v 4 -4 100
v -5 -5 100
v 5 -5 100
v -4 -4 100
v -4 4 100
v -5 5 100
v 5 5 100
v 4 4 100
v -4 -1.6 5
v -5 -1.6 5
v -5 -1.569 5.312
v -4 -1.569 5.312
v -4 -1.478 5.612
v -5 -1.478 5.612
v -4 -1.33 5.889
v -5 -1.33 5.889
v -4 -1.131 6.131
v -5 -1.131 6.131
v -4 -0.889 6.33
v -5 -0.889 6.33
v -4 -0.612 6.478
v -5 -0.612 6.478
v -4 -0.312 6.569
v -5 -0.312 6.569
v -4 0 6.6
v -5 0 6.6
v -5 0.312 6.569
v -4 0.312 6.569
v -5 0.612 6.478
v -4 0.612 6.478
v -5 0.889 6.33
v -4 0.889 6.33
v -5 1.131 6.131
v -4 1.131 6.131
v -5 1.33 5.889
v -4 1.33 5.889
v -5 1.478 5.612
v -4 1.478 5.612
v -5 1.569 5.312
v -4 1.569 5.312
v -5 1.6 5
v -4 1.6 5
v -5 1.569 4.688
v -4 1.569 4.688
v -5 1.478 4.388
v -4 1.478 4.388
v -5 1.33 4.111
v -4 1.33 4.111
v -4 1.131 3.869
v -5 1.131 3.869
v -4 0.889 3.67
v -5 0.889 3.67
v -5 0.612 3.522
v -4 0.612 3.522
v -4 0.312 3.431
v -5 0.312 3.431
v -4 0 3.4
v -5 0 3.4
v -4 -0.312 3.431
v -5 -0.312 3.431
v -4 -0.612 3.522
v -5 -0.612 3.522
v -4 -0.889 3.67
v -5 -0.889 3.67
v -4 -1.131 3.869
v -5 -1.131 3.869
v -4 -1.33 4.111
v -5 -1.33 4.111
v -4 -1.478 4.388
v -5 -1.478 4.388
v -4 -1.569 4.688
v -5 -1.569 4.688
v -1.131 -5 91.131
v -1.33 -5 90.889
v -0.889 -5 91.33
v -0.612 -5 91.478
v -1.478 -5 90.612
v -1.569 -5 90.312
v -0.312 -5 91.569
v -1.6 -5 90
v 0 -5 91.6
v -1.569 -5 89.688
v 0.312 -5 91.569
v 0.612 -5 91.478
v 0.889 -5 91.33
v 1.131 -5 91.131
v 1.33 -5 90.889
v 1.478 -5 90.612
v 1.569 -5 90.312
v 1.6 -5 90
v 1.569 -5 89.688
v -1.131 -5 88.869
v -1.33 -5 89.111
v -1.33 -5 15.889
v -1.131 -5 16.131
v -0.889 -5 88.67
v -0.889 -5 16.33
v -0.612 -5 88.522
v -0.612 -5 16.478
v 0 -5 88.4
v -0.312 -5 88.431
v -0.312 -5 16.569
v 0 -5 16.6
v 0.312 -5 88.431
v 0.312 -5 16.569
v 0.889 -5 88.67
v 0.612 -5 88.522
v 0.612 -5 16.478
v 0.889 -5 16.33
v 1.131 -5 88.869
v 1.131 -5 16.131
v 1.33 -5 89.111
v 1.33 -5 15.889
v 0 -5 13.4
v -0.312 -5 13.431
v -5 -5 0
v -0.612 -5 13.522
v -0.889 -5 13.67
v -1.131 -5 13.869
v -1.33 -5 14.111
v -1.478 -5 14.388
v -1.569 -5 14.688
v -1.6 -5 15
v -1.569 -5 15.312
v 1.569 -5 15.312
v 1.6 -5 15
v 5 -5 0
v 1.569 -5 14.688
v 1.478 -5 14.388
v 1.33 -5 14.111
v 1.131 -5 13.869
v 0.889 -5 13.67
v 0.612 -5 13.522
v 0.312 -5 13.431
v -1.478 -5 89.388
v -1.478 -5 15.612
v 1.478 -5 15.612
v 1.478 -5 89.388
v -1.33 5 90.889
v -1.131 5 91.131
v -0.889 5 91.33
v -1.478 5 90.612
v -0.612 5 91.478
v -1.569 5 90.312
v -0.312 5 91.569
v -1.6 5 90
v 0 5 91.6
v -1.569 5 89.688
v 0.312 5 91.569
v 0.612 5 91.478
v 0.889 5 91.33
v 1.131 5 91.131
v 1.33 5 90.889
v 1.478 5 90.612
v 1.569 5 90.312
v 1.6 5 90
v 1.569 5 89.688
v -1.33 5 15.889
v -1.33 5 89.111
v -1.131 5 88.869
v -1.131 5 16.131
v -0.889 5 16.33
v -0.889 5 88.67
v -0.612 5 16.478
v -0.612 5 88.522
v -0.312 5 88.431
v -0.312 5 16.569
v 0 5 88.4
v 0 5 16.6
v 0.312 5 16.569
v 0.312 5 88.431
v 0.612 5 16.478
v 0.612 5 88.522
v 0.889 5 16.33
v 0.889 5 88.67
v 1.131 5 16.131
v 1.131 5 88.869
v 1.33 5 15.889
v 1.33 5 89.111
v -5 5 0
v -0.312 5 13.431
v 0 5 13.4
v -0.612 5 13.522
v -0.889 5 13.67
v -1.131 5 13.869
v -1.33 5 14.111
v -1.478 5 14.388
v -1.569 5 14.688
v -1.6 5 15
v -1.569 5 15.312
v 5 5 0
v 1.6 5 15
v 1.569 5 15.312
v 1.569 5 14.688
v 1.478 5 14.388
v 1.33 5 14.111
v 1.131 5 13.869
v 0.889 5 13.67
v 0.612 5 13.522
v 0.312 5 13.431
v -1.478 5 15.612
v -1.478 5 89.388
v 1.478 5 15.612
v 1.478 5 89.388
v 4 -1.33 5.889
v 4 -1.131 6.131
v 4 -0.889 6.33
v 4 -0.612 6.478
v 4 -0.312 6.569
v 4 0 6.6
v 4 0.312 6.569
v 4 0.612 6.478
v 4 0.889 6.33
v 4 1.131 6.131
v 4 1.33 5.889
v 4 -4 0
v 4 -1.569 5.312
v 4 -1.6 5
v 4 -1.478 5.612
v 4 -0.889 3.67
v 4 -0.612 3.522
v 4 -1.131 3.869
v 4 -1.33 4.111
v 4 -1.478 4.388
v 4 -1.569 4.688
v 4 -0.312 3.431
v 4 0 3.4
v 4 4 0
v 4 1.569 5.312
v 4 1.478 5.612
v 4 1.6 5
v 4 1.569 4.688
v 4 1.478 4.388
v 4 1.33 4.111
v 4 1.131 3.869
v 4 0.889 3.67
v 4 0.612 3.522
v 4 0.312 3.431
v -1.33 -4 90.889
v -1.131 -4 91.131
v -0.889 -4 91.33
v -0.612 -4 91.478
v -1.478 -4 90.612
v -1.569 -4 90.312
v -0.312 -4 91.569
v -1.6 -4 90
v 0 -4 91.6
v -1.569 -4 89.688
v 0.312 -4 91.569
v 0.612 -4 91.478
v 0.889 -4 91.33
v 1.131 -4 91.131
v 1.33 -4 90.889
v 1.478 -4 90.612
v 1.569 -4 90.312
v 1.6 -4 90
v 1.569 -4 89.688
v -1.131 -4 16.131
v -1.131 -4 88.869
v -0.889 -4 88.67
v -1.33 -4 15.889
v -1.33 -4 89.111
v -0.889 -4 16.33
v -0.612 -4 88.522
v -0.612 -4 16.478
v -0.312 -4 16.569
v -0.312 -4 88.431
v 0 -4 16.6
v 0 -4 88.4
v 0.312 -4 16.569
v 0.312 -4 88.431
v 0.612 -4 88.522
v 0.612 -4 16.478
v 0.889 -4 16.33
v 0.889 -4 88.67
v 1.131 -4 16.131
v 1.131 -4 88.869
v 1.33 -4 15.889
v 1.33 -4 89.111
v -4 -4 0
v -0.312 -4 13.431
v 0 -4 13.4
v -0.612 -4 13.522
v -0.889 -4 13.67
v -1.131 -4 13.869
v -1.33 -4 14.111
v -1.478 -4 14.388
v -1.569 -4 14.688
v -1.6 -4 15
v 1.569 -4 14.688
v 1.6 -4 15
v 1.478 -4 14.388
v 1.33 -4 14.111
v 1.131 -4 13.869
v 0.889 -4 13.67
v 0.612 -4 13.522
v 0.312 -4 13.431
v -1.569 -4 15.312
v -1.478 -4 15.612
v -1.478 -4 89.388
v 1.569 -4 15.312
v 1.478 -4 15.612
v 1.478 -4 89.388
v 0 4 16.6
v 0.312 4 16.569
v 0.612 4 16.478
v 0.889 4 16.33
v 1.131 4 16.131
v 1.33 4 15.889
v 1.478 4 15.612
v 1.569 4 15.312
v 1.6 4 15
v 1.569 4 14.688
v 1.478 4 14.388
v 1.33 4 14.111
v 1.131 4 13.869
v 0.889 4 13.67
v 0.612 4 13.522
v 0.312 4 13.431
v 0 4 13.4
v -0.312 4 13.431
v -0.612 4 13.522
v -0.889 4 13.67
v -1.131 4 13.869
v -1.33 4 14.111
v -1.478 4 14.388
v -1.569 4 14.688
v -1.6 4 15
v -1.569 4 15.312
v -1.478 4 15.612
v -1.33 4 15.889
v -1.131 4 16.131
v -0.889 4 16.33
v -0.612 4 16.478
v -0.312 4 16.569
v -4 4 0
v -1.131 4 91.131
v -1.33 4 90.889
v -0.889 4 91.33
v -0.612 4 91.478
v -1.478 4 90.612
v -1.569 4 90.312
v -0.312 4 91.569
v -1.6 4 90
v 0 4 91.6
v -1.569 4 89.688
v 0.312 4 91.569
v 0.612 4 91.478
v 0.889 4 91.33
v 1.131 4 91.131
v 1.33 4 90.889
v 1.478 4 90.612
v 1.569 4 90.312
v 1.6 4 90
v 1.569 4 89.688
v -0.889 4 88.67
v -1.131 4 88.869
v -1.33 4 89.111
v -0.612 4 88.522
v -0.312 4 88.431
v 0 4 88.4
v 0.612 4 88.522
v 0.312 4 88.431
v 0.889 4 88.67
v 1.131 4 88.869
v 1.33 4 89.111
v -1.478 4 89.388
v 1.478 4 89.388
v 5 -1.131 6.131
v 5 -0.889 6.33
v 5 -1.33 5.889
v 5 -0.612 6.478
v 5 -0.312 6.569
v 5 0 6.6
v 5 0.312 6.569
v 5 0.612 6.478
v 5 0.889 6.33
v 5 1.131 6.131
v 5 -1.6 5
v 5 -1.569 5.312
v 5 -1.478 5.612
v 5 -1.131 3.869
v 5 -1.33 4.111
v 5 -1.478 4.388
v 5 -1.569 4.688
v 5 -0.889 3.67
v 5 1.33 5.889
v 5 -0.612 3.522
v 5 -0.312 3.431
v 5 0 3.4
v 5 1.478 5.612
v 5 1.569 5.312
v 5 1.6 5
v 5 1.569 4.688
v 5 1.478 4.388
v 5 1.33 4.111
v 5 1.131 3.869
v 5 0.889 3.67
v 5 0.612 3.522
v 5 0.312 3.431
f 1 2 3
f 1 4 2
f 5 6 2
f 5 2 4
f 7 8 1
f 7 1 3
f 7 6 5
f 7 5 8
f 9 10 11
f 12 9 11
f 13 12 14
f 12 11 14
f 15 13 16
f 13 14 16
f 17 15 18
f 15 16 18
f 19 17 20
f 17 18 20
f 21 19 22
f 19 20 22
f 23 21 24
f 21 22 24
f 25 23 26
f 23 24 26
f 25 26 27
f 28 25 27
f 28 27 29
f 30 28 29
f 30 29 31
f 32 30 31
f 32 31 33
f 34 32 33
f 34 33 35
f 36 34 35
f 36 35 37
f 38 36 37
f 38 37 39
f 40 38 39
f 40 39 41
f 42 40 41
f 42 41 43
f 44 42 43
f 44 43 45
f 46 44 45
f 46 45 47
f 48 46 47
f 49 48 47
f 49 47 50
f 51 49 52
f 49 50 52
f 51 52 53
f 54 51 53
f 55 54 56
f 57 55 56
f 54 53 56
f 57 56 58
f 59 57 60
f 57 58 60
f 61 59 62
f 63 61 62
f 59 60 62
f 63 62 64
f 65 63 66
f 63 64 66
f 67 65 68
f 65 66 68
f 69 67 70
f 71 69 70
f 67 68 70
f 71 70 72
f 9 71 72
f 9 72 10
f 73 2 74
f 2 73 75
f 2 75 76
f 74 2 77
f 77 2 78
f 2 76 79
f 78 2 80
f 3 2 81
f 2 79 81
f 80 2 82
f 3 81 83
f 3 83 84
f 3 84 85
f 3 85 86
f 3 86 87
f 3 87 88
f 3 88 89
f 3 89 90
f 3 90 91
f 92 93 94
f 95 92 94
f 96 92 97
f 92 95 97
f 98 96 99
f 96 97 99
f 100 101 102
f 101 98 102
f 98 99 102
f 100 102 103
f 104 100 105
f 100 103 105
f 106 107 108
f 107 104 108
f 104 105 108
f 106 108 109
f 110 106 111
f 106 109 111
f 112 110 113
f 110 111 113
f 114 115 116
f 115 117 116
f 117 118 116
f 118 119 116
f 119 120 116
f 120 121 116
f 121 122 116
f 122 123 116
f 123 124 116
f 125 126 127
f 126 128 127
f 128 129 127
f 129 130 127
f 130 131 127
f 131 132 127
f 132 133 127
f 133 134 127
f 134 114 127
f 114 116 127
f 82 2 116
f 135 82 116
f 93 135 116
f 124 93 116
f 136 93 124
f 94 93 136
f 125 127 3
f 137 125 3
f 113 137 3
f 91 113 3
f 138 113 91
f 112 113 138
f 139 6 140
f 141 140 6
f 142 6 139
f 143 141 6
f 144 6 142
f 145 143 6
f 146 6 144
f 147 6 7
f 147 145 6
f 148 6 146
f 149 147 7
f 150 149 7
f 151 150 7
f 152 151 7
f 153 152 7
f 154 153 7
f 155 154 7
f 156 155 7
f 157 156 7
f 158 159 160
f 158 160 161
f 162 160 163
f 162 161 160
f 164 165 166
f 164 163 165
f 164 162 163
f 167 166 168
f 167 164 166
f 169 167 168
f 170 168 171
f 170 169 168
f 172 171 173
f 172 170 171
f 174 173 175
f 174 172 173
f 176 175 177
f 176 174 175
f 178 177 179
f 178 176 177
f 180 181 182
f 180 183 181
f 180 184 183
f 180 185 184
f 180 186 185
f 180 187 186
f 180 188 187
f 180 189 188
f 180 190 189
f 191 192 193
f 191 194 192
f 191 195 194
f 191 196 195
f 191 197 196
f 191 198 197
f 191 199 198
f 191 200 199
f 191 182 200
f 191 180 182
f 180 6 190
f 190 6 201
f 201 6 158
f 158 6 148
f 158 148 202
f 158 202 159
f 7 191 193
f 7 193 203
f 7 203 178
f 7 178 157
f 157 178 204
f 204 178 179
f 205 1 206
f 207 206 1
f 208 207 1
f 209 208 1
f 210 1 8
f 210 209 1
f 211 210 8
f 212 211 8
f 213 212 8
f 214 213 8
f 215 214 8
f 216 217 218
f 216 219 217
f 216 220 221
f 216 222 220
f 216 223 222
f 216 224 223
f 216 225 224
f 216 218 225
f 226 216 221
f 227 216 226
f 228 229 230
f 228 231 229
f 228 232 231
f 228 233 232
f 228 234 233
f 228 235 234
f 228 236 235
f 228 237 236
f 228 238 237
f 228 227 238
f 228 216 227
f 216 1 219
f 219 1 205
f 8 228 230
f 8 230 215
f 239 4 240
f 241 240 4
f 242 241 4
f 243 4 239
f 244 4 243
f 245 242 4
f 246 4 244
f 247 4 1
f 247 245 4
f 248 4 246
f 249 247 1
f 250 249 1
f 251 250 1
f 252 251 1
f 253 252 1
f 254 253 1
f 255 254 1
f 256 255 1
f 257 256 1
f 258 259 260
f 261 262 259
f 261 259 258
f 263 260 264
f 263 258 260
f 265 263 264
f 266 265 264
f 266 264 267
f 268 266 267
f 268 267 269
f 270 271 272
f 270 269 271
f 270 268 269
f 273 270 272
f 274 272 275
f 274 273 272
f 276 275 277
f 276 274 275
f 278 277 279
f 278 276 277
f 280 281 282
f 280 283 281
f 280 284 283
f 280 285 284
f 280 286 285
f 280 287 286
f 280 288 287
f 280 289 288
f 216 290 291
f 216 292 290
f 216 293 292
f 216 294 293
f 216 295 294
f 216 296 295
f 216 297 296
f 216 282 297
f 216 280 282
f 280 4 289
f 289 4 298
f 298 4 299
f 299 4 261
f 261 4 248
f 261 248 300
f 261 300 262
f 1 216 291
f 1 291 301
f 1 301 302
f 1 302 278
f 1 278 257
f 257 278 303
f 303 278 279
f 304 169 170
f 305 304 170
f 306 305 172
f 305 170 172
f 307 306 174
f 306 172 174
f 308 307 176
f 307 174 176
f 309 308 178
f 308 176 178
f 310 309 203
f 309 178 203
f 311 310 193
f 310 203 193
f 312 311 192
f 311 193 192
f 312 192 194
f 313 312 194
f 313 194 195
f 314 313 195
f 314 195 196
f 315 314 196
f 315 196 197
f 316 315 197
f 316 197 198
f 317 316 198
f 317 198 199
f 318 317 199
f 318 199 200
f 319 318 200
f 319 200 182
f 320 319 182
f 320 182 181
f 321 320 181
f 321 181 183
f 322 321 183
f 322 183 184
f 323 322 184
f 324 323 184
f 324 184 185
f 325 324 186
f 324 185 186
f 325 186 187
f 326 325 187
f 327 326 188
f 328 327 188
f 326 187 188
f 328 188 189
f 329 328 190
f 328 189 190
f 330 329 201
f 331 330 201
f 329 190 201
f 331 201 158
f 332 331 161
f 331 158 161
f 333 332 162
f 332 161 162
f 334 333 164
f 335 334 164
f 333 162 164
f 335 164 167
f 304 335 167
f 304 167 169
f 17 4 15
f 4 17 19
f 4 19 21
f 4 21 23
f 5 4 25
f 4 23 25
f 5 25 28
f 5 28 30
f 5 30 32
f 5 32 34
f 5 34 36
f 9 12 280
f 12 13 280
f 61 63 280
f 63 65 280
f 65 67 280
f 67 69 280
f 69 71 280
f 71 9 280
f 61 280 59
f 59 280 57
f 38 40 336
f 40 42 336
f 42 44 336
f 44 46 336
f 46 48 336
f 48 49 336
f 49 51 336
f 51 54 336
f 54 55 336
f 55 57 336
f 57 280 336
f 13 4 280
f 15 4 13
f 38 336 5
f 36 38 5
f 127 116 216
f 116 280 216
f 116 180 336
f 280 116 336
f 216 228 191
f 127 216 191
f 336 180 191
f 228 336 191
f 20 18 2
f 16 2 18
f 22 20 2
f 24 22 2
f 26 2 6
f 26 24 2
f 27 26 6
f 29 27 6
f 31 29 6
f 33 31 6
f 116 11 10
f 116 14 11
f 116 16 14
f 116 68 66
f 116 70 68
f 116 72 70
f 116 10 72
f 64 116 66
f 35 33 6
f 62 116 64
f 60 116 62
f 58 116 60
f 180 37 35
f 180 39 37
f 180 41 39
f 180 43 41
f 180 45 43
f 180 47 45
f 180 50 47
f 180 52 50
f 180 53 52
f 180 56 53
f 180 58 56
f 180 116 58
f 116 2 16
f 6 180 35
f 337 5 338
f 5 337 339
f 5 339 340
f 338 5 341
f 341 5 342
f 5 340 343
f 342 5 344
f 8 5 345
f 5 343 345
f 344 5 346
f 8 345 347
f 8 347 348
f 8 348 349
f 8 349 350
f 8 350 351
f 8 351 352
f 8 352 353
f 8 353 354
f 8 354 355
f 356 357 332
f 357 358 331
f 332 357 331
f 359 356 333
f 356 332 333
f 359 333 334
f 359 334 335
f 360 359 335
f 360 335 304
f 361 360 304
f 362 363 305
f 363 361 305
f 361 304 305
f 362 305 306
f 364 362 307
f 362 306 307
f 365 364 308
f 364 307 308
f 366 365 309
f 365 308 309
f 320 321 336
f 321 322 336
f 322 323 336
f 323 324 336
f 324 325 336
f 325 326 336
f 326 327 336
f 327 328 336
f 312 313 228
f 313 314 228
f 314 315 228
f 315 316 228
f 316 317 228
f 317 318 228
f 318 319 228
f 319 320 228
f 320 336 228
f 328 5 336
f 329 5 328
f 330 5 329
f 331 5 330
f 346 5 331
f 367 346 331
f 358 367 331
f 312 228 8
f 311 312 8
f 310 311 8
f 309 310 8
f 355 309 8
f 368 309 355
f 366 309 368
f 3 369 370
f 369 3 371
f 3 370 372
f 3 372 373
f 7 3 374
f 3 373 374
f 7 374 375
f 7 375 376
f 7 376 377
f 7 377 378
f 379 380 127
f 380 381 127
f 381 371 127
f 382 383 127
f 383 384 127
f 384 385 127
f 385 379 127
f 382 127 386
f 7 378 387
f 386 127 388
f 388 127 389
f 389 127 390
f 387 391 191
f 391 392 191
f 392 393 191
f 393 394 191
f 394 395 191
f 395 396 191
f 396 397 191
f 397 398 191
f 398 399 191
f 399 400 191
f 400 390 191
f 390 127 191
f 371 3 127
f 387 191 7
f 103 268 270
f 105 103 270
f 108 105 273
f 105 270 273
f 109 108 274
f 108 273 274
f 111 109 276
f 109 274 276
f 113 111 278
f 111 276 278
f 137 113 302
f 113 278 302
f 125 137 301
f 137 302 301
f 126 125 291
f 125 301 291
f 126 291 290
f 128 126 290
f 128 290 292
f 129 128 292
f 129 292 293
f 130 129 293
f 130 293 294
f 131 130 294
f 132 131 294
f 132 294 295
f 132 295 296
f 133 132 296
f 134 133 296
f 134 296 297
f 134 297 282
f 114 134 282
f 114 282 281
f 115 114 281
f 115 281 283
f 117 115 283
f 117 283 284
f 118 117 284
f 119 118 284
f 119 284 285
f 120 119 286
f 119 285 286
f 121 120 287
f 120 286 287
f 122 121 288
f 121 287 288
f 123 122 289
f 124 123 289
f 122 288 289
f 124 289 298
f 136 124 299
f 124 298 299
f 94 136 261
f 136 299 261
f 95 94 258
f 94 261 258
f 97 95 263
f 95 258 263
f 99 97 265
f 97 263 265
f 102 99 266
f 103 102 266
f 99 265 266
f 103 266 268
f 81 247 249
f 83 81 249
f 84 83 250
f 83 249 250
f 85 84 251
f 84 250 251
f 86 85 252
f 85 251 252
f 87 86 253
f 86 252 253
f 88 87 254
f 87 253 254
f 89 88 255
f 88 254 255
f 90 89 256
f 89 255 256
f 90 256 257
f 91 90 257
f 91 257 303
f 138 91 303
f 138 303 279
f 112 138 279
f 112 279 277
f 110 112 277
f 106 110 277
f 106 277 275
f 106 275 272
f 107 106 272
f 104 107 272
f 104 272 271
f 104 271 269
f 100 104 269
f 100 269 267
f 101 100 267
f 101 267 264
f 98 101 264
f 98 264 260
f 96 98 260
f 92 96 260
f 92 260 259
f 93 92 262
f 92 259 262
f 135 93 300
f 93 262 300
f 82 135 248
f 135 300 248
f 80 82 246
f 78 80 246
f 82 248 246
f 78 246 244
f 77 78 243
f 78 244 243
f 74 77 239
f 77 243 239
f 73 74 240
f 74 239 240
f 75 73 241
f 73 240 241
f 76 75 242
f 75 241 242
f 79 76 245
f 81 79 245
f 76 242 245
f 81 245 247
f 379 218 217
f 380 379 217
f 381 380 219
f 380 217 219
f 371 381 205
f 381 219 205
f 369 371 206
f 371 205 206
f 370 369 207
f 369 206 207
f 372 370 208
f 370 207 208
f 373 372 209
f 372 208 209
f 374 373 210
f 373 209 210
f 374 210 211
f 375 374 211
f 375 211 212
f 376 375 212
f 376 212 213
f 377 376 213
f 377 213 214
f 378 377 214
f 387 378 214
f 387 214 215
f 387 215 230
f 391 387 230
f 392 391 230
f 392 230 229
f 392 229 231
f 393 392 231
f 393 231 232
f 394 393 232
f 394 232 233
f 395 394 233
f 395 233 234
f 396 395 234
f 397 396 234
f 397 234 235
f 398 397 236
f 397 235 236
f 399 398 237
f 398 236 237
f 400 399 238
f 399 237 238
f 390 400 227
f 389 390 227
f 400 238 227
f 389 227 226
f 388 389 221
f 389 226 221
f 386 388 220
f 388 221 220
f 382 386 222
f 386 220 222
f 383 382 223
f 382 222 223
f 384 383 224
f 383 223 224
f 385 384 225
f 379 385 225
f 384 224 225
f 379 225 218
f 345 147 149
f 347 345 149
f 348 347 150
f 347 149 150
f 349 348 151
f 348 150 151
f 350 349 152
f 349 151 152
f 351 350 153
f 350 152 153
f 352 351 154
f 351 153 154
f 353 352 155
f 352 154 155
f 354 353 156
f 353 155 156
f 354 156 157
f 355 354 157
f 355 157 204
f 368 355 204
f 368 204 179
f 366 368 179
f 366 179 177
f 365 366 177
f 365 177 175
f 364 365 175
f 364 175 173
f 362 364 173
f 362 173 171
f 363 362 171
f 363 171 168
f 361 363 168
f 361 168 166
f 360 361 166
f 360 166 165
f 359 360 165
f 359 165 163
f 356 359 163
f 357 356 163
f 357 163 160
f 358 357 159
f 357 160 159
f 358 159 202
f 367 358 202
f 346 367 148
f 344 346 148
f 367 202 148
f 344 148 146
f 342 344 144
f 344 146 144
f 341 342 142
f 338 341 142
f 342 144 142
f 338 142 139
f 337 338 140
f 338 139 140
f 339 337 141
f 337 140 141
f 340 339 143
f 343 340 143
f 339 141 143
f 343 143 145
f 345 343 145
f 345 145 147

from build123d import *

# Parameters (mm, degrees)
SKETCH_1_W          = 10
SKETCH_1_H          = 10
SKETCH_1_W_2        = 8
SKETCH_1_H_2        = 8
EXTRUDE_1_DEPTH     = 100
SKETCH_2_R          = 1.6
CUT_EXTRUDE_1_DEPTH = 101.623058987
SKETCH_3_R          = 1.6
CUT_EXTRUDE_2_DEPTH = 101.623058987
SKETCH_5_R          = 1.6
CUT_EXTRUDE_4_DEPTH = 101.623058987


with BuildPart() as part:
    # ｽｹｯﾁ1 → ﾎﾞｽ - 押し出し1 (new body)
    with BuildSketch(Plane.XY):
        Rectangle(SKETCH_1_W, SKETCH_1_H)
        Rectangle(SKETCH_1_W_2, SKETCH_1_H_2, mode=Mode.SUBTRACT)
    extrude(amount=EXTRUDE_1_DEPTH)

    # ｽｹｯﾁ2 → ｶｯﾄ - 押し出し1 (cut, through all)
    with BuildSketch(Plane.ZY.offset(5)):
        with Locations(Location((5, 0, 0), (0, 0, 270))):
            Circle(SKETCH_2_R)
    extrude(amount=-CUT_EXTRUDE_1_DEPTH, mode=Mode.SUBTRACT)

    # ｽｹｯﾁ3 → ｶｯﾄ - 押し出し2 (cut, through all)
    with BuildSketch(Plane(origin=(0, 5, 0), x_dir=(1, 0, 0), z_dir=(0, 1, 0))):
        with Locations(Location((0, -90, 0), (0, 0, 270))):
            Circle(SKETCH_3_R)
    extrude(amount=-CUT_EXTRUDE_2_DEPTH, mode=Mode.SUBTRACT)

    # ｽｹｯﾁ5 → ｶｯﾄ - 押し出し4 (cut, through all)
    with BuildSketch(Plane(origin=(0, 5, 0), x_dir=(1, 0, 0), z_dir=(0, 1, 0))):
        with Locations(Location((0, -15, 0), (0, 0, 270))):
            Circle(SKETCH_5_R)
    extrude(amount=-CUT_EXTRUDE_4_DEPTH, mode=Mode.SUBTRACT)


solid = part.part
